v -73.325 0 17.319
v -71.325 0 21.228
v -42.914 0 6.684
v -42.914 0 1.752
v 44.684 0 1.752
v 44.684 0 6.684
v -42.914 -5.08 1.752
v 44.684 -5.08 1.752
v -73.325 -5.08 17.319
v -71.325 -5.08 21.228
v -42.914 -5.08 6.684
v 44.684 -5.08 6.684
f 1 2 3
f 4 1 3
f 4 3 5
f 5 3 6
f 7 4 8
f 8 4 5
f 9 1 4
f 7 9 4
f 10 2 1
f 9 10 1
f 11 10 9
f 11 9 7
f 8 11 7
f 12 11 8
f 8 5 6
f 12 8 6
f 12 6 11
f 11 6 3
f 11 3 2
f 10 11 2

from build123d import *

# Parameters (mm, degrees)
F1_DEPTH = 5.08
F4_DEPTH = 5.08


with BuildPart() as f1:
    # F0 (on Front) → F1 (new body)
    with BuildSketch(Plane.XZ):
        Polygon((47.7003678679, -8.732332848), (46.3905222714, -5.2393996157), (-41.3694269955, -5.2393996157), (-79.3550759554, 16.3731239736), (-81.8319656057, 12.019802605), (-41.3694269955, -8.732332848), align=None)
    extrude(amount=F1_DEPTH)


with BuildPart() as f4:
    # F3 (on Front) → F4 (new body)
    with BuildSketch(Plane.XZ):
        Polygon((44.6835160255, 1.7520437361), (44.6835160255, 6.6843586974), (-42.9144240916, 6.6843586974), (-71.3245719671, 21.2276466191), (-73.3251918619, 17.3194583635), (-42.9144240916, 1.7520437361), align=None)
    extrude(amount=F4_DEPTH)


solid = f4.part
